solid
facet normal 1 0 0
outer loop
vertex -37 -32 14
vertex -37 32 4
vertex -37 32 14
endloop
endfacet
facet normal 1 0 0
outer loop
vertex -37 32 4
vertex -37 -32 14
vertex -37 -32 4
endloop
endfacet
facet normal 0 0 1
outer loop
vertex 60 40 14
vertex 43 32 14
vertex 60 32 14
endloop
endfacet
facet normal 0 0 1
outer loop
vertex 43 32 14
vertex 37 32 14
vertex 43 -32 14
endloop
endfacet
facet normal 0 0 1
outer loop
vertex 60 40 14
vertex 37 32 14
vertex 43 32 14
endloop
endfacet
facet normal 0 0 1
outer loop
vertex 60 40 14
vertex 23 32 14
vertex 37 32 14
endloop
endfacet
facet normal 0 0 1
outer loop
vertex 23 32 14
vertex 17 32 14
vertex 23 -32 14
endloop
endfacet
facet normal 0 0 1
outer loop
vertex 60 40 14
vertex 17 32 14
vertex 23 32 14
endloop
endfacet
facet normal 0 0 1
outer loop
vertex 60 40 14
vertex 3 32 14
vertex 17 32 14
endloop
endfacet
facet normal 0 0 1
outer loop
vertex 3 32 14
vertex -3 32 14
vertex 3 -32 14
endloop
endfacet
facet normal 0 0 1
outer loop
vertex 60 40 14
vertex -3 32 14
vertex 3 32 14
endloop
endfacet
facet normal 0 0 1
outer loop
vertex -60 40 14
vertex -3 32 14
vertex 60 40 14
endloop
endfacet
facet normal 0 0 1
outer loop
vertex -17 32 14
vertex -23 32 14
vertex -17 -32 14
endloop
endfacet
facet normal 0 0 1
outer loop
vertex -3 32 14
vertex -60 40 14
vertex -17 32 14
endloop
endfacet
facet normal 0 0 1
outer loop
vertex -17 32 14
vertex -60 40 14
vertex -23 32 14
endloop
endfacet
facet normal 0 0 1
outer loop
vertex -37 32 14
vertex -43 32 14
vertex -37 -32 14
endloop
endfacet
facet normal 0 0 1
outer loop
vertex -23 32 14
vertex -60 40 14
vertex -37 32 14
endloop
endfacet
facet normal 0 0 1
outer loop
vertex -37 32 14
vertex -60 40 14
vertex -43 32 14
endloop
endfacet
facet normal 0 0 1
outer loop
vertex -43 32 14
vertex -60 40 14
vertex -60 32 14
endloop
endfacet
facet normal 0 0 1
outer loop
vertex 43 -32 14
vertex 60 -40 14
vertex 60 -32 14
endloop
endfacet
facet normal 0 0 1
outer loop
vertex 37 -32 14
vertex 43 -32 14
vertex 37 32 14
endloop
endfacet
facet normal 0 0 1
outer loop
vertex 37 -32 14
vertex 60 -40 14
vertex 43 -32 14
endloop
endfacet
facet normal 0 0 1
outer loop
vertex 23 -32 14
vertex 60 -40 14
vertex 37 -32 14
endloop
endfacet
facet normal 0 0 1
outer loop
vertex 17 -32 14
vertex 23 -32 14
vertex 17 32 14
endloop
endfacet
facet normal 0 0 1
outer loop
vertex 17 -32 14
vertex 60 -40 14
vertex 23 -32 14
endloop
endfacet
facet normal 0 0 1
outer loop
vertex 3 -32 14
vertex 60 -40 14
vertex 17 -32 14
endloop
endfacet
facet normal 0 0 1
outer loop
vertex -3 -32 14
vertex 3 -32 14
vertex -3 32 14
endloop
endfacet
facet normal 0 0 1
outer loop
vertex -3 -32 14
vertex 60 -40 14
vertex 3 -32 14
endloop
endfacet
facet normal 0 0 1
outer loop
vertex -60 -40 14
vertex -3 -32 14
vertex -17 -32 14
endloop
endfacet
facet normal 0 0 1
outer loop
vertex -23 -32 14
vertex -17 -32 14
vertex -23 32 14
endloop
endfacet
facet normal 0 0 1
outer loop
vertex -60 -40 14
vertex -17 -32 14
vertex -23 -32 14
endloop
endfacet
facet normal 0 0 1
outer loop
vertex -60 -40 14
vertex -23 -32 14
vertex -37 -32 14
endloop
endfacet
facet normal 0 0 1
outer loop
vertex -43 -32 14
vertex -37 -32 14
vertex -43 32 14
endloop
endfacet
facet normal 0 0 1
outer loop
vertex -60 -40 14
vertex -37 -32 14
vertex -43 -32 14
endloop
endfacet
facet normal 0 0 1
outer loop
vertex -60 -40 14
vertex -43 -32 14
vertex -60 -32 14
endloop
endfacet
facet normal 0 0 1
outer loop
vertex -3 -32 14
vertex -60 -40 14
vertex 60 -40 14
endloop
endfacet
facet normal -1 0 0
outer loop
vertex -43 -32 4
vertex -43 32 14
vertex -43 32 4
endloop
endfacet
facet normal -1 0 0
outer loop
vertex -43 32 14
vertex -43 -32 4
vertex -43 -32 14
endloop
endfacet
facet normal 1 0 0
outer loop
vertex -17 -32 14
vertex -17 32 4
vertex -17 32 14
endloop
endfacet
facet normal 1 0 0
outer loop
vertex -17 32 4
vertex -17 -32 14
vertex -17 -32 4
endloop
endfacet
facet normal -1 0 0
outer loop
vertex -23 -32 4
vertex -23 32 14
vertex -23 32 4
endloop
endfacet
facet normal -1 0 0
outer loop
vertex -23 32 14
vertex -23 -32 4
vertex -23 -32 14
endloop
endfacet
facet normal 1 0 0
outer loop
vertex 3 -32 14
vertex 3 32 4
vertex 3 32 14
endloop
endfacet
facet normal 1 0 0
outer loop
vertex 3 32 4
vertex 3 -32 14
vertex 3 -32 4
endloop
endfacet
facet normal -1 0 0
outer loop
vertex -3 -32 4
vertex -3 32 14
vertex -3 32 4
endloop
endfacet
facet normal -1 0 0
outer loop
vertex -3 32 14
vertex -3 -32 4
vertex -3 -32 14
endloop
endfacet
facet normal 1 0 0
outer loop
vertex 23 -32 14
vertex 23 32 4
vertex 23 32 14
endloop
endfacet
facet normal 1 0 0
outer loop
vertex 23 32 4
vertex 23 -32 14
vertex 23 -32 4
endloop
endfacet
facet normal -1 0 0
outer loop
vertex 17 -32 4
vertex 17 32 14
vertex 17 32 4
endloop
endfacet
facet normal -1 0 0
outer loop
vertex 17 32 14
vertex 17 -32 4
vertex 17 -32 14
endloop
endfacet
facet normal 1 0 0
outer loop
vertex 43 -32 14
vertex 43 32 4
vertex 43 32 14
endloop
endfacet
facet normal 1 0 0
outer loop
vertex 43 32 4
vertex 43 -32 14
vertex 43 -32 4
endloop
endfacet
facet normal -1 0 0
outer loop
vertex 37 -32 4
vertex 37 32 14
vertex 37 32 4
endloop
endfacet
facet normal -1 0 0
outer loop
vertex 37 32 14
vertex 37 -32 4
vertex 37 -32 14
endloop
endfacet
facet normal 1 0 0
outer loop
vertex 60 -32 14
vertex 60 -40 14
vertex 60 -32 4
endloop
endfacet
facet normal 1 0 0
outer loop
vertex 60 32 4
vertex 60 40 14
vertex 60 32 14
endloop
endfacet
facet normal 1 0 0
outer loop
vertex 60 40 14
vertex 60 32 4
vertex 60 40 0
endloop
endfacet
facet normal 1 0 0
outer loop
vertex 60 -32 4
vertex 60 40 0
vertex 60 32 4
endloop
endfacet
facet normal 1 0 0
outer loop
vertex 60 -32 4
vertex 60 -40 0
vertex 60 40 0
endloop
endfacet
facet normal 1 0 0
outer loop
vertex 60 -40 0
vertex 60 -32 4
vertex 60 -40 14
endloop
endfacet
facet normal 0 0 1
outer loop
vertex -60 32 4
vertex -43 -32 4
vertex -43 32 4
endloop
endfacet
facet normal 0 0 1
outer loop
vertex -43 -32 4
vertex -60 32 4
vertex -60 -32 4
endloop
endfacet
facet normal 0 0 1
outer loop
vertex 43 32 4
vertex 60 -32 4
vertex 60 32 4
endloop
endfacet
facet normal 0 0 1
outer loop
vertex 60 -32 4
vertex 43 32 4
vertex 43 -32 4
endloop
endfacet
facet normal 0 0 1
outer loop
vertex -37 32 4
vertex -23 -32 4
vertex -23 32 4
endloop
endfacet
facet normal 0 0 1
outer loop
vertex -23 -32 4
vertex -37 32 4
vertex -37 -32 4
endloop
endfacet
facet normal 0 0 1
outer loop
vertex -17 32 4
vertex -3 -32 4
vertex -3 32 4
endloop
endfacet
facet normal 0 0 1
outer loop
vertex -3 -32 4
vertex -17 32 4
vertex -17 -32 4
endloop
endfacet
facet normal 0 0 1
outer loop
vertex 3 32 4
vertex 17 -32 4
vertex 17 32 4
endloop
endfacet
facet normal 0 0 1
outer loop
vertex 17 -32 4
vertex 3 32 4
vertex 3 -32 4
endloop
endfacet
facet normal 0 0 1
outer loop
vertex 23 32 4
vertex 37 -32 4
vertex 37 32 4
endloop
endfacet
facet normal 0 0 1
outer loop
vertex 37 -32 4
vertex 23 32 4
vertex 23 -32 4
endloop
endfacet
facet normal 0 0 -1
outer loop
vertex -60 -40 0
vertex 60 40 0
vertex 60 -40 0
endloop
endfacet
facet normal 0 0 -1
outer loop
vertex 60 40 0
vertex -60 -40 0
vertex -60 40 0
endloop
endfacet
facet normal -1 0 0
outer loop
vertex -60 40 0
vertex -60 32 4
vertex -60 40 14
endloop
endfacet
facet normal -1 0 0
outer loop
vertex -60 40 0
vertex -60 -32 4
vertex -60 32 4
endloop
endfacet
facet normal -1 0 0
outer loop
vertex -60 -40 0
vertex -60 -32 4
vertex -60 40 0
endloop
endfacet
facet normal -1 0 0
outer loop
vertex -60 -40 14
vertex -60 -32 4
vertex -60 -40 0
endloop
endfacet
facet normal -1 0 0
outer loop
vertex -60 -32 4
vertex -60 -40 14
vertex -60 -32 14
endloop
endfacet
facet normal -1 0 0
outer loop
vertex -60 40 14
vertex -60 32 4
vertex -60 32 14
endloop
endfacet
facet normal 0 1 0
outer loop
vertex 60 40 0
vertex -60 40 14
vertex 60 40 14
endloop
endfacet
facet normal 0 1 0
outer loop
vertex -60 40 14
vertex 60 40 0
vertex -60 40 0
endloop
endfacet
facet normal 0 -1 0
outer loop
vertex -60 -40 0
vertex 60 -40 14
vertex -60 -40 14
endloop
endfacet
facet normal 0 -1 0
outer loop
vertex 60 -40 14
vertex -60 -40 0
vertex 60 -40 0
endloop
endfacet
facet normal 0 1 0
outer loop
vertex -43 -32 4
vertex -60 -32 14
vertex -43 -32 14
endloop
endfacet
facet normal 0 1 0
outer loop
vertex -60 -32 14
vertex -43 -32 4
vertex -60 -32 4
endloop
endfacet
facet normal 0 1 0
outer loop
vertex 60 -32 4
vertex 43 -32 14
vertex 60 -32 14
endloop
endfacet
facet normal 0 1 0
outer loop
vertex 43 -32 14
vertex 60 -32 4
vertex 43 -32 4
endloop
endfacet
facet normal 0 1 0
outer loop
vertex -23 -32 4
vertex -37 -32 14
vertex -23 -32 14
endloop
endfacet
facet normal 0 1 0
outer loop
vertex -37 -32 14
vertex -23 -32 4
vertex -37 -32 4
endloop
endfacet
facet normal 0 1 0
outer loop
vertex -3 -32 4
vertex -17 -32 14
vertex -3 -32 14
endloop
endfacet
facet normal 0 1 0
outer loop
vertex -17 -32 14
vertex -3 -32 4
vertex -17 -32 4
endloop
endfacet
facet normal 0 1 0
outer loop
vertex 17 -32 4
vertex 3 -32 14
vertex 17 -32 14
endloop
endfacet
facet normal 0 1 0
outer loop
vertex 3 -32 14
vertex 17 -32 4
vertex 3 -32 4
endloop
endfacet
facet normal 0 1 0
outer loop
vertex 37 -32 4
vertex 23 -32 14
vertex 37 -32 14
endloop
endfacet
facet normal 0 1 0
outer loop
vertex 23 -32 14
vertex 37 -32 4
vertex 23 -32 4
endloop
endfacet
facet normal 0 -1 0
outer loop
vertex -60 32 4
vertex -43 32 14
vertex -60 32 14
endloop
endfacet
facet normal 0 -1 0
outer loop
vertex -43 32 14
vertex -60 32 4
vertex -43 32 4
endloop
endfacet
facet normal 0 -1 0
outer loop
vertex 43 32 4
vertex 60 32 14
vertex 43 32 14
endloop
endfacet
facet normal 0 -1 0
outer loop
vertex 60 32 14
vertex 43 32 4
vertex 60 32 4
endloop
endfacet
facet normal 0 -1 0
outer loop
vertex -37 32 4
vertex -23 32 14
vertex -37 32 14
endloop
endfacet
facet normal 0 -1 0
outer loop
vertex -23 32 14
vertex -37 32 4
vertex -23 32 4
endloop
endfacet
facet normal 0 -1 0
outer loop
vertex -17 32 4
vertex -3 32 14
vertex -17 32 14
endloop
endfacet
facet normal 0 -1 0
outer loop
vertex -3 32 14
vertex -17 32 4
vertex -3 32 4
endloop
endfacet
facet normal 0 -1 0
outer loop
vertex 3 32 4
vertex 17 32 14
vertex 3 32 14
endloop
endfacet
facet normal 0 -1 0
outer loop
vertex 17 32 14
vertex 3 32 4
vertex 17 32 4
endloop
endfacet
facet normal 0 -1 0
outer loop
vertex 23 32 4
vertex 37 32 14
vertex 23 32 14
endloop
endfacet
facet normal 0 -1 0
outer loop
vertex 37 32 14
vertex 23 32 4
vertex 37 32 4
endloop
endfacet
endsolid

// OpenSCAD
$fn = 32;

// ----------------------------------------------------------------------
// Rib frame 120 x 80 x 14
// 5 ribs at 20 mm pitch
// ----------------------------------------------------------------------

// --- parameters (mm) ---
frame = [120, 80, 4];  // base plate size (x, y, z)
rail_w = 8;            // side rail width
ribs = 5;              // number of ribs
rib_t = 6;             // rib thickness
rib_h = 10;            // rib height above the base plate
pitch = 20;            // pitch between rib centres

// --- derived feature positions (mm) ---
span = (ribs - 1) * pitch;          // = 80   distance between the outer ribs
origin_x = -span / 2;               // = -40   X of the first rib
rib_len = frame[1] - 2 * rail_w + 2;  // = 66   rib length, 1 mm into each rail
feature_centers = [
  [origin_x + 0 * pitch, 0],
  [origin_x + 1 * pitch, 0],
  [origin_x + 2 * pitch, 0],
  [origin_x + 3 * pitch, 0],
  [origin_x + 4 * pitch, 0]
];   // rib centre line, drives the rib loop

// base plate, two side rails, then the ribs read straight off feature_centers
union() {
  translate([-frame[0] / 2, -frame[1] / 2, 0]) cube(frame);
  translate([-frame[0] / 2, -frame[1] / 2, 0]) cube([frame[0], rail_w, frame[2] + rib_h]);
  translate([-frame[0] / 2, frame[1] / 2 - rail_w, 0]) cube([frame[0], rail_w, frame[2] + rib_h]);
  for (centre = feature_centers)
    translate([centre[0] - rib_t / 2, centre[1] - rib_len / 2, frame[2] - 1])
      cube([rib_t, rib_len, rib_h + 1]);
}
